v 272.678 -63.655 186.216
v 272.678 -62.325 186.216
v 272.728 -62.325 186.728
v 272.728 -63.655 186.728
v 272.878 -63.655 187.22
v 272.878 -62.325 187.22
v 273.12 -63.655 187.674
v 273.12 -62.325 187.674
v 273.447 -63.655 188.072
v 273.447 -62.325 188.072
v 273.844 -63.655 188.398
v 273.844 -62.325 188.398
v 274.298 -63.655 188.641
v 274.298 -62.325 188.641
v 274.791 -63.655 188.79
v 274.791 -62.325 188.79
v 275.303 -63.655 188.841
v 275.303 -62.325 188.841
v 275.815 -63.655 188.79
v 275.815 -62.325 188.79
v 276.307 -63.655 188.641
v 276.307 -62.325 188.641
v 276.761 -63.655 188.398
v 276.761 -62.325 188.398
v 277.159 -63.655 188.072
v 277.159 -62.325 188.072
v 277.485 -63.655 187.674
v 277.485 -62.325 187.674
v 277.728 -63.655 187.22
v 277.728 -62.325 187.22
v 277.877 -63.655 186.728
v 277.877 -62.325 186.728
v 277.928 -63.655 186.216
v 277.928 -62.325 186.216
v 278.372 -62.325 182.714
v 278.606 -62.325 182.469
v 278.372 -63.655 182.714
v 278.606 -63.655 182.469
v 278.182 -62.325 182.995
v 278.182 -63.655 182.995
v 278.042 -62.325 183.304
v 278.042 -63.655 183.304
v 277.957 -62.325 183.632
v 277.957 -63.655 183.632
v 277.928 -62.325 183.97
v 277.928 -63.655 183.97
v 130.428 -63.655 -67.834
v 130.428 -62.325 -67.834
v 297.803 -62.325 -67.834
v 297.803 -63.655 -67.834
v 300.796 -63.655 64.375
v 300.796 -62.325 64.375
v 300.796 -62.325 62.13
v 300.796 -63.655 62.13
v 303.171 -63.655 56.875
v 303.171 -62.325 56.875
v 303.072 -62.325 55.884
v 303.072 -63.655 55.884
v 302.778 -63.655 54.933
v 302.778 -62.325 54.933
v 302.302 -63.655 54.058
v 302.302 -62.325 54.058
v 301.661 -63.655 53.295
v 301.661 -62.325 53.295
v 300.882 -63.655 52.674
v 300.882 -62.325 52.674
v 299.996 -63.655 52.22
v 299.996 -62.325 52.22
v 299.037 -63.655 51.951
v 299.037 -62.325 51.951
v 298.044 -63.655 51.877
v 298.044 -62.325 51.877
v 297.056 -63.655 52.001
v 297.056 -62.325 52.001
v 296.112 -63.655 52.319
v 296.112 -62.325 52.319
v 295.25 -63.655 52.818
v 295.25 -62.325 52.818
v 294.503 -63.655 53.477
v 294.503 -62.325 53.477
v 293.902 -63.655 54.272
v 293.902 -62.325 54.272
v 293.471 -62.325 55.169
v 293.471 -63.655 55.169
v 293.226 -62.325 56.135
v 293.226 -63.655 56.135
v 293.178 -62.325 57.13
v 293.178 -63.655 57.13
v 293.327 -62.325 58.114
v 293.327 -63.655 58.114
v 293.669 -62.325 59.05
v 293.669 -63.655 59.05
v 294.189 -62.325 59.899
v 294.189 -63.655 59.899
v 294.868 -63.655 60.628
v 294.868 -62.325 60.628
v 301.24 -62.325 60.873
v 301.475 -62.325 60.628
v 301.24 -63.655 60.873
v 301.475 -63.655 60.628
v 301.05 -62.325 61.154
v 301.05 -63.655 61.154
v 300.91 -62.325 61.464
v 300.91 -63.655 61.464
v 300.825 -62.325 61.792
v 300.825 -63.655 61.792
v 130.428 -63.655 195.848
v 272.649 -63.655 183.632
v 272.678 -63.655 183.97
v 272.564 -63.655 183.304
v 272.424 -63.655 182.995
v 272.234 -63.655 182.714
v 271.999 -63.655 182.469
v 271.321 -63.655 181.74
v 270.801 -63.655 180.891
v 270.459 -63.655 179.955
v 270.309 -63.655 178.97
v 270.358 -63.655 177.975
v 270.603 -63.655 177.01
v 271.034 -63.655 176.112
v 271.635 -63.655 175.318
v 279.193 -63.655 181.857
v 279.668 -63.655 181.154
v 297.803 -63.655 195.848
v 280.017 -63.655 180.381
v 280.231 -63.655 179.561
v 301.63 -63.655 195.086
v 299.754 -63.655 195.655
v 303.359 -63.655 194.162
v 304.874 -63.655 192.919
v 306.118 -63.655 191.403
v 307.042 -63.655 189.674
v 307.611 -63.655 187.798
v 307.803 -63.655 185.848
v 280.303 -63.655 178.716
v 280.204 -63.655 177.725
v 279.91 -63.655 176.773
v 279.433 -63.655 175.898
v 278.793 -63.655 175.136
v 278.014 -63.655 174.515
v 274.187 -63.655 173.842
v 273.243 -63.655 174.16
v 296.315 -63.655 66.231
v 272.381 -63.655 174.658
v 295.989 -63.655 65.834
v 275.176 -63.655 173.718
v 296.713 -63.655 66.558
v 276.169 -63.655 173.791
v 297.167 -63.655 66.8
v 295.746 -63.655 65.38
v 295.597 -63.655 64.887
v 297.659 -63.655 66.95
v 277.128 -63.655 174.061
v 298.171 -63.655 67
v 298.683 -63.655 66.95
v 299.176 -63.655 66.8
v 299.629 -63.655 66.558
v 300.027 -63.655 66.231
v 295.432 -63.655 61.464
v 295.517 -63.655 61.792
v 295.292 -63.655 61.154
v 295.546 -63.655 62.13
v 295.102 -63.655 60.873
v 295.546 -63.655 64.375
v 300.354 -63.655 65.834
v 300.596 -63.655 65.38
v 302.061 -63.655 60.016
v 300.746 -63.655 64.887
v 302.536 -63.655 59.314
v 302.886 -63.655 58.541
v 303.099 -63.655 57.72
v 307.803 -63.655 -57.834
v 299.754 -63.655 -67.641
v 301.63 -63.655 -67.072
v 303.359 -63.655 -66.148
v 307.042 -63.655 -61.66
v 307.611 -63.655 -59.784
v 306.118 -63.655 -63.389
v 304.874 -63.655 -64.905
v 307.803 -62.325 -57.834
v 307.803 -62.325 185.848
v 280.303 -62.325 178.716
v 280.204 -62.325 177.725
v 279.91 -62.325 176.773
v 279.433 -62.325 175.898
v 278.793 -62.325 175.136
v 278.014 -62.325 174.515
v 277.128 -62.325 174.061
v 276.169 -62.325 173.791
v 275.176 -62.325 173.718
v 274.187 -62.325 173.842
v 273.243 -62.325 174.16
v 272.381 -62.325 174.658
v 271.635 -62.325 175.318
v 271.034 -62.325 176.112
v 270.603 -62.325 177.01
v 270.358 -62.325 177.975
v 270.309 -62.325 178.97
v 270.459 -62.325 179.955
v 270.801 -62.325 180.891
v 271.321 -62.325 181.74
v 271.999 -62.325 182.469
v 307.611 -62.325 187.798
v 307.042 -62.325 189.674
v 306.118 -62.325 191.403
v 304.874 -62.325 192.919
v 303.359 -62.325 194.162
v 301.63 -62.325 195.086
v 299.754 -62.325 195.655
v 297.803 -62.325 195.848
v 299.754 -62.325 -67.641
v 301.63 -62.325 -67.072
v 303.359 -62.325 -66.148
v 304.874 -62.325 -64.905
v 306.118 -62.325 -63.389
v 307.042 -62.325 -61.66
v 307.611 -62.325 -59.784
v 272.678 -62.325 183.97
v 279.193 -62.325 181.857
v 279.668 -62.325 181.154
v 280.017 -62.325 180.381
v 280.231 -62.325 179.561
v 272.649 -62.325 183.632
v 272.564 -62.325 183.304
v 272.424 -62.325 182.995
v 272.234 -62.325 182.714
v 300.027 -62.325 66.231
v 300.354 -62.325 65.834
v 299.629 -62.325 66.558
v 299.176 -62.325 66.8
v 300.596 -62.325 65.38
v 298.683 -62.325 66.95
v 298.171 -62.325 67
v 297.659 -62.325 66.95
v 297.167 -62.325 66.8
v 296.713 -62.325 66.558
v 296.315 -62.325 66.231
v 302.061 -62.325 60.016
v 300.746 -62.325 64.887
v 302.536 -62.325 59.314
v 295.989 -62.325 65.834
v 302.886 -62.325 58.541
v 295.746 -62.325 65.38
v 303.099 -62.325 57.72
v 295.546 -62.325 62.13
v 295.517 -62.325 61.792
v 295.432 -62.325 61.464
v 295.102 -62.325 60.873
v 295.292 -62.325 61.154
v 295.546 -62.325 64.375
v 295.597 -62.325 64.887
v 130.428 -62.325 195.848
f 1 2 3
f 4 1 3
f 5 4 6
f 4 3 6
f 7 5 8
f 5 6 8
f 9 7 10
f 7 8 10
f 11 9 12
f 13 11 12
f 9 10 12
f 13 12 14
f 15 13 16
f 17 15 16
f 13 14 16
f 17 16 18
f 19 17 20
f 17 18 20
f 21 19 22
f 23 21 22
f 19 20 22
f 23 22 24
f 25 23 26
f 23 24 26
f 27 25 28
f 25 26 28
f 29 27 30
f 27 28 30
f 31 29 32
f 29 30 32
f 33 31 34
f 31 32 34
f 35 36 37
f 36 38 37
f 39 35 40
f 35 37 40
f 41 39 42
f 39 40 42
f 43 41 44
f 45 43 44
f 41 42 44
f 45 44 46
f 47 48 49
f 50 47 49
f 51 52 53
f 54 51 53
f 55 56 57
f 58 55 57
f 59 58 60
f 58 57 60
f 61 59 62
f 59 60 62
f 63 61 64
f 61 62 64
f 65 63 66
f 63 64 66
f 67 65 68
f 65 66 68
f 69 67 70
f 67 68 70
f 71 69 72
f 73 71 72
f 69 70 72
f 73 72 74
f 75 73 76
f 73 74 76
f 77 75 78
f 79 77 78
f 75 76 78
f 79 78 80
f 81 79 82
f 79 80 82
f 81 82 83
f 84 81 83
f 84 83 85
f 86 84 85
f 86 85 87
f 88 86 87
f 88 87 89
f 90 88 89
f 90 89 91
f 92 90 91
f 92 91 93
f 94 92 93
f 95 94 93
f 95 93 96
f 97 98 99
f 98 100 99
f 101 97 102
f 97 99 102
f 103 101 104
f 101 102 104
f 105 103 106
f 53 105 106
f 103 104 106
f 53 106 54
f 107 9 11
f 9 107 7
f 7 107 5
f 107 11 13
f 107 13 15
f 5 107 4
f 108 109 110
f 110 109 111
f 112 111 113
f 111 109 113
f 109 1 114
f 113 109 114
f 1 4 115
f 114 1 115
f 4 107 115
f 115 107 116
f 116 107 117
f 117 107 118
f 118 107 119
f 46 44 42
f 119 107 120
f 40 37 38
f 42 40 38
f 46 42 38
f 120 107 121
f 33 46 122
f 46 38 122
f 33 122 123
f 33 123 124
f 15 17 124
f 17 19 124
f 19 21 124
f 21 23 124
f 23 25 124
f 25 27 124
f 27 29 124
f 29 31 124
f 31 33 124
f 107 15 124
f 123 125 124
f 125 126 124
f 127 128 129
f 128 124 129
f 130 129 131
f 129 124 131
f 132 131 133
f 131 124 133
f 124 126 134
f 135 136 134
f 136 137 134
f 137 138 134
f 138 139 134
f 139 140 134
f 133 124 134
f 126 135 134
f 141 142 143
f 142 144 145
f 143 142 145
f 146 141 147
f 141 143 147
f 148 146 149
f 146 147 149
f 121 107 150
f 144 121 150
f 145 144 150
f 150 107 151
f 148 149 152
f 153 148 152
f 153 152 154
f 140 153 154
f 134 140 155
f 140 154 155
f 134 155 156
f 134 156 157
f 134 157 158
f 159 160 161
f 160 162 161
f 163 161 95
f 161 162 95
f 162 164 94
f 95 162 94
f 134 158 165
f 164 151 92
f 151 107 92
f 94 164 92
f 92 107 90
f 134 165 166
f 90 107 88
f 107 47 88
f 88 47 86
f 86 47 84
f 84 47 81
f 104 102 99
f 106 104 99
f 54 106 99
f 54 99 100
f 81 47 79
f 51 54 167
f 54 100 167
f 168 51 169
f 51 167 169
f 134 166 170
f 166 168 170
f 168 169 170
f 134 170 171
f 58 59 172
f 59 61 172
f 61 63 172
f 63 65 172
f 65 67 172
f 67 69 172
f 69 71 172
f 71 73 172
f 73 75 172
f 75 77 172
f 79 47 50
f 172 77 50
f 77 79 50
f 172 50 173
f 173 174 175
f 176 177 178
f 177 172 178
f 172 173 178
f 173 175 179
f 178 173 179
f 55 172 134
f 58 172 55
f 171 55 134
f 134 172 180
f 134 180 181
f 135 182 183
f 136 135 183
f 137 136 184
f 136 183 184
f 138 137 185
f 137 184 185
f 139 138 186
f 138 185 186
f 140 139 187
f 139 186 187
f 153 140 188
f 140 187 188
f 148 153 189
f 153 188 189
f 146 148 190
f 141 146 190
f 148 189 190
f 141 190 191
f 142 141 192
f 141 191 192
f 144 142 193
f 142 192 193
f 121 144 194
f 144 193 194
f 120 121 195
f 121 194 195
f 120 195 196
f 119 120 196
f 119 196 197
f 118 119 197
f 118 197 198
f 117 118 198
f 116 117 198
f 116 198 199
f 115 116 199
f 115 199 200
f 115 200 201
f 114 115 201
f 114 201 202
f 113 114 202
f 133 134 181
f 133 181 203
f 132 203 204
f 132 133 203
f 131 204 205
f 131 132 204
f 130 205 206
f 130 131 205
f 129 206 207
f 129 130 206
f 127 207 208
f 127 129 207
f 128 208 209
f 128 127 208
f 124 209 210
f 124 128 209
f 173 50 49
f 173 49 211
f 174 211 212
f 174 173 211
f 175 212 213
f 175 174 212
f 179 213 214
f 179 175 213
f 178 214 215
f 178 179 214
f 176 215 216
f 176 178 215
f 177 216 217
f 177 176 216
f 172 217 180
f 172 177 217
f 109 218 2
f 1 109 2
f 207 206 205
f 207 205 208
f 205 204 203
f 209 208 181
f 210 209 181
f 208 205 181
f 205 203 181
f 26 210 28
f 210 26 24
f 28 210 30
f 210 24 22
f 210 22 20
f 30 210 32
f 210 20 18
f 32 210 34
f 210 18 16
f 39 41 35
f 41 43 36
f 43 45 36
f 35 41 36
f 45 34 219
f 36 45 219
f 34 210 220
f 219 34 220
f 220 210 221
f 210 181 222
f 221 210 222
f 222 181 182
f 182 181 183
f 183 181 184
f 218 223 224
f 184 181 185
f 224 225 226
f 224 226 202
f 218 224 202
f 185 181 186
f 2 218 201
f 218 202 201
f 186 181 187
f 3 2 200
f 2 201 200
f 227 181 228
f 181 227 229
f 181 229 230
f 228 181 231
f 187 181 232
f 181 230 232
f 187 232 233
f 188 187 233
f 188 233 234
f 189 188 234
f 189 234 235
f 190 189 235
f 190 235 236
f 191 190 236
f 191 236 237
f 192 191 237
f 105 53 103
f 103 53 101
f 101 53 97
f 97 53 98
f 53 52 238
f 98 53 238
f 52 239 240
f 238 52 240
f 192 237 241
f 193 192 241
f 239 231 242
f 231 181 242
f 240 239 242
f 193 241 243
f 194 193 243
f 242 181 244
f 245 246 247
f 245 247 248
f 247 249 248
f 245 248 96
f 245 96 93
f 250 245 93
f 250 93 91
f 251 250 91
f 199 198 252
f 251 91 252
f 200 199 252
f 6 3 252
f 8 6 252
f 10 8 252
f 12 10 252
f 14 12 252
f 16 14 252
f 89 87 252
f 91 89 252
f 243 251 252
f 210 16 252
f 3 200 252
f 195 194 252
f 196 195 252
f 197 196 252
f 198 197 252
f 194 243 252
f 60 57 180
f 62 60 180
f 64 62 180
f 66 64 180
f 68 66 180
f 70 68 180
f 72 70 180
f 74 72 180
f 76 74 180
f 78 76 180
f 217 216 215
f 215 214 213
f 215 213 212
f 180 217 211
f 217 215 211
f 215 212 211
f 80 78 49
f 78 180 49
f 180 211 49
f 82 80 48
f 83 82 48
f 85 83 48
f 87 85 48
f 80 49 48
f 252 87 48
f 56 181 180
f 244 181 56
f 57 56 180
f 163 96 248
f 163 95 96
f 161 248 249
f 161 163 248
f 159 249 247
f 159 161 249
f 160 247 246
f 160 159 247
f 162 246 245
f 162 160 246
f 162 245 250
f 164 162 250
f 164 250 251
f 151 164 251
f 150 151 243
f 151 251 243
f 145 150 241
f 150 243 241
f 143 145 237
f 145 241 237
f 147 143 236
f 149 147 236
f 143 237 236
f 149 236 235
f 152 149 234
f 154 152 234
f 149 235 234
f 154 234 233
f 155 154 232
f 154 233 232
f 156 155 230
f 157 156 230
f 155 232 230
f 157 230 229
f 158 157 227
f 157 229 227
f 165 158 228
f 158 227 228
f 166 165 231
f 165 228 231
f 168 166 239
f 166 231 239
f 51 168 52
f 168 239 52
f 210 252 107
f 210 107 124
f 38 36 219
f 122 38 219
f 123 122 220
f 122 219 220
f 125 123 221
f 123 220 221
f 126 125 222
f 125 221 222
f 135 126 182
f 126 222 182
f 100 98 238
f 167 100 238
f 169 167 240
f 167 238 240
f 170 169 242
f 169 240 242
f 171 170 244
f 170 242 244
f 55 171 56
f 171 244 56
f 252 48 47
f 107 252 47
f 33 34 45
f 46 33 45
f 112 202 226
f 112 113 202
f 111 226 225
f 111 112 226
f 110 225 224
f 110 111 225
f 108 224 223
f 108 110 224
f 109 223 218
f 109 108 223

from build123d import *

# Parameters (mm, degrees)
BASE_FLANGE2_DEPTH         = 1.33
EDGE_FLANGE3_DEPTH         = 263.681161317
CAPTIVE_M5_BOLT_SLOT_REACH = 370.8
HOLE_FILLETS_R             = 2
HEM2_START                 = -67.833575783
HEM2_DEPTH                 = 263.681161317
HEM2_2_DEPTH               = 263.681161317
FLAT_PATTERN2_START        = -67.833575783
FLAT_PATTERN2_DEPTH        = 263.681161317
FLAT_PATTERN2_2_DEPTH      = 263.681161317


# Read off the part's stored shape, not the designer's step: Hem2, Flat-Pattern2
# Sheet-metal steps are written as plain solids
with BuildPart() as part:
    # Sketch5 → Base-Flange2 (new body)
    with BuildSketch(Plane(origin=(0, -63.655404639, 0), x_dir=(-1, 0, 0), z_dir=(0, 1, 0))):
        with BuildLine():
            Line((-297.802816543, 195.847585534), (-194.039416543, 195.847585534))
            Line((-194.039416543, 195.847585534), (-194.039416543, -67.833575783))
            Line((-194.039416543, -67.833575783), (-297.802816543, -67.833575783))
            ThreePointArc((-297.802816543, -67.833575783), (-304.873884355, -64.904643594), (-307.802816543, -57.833575783))
            Line((-307.802816543, -57.833575783), (-307.802816543, 185.847585534))
            ThreePointArc((-307.802816543, 185.847585534), (-304.873884355, 192.918653346), (-297.802816543, 195.847585534))
        make_face()
    extrude(amount=BASE_FLANGE2_DEPTH)

    # Edge-Flange3 section (across the edge) → Edge-Flange3 (add)
    with BuildSketch(Plane(origin=(193.302816543, -63.655404639, 195.847585534), x_dir=(1, 0, 0), z_dir=(0, 0, -1))):
        with BuildLine():
            Line((-1.33, 0.7366), (-1.33, 52.66))
            Line((-1.33, 52.66), (0, 52.66))
            Line((0, 52.66), (0, 0.7366))
            ThreePointArc((0, 0.7366), (0.215745145, 0.215745145), (0.7366, 0))
            Line((0.7366, 0), (0.7366, -1.33))
            ThreePointArc((0.7366, -1.33), (-0.724706874, -0.724706874), (-1.33, 0.7366))
        make_face()
    extrude(amount=EDGE_FLANGE3_DEPTH)

    # Sketch17 → Captive M5 Bolt Slot (cut, up to next)
    with BuildSketch(Plane(origin=(0, -62.325404639, 0), x_dir=(1, 0, 0), z_dir=(0, 1, 0)), mode=Mode.PRIVATE) as captive_m5_bolt_slot_sk1:
        with BuildLine():
            ThreePointArc((280.302816543, -178.715885534), (272.866117957, -174.349823235), (272.677816543, -182.971396667))
            Line((272.677816543, -182.971396667), (272.677816543, -178.715885534))
            ThreePointArc((272.677816543, -178.715885534), (275.302816543, -176.090885534), (277.927816543, -178.715885534))
            Line((277.927816543, -178.715885534), (277.927816543, -182.971396667))
            ThreePointArc((277.927816543, -182.971396667), (279.668878843, -181.15258412), (280.302816543, -178.715885534))
        make_face()
    captive_m5_bolt_slot_tool1 = extrude(captive_m5_bolt_slot_sk1.sketch, amount=-CAPTIVE_M5_BOLT_SLOT_REACH, mode=Mode.PRIVATE) & part.part
    # Sketch17 → Captive M5 Bolt Slot (cut, up to next)
    with BuildSketch(Plane(origin=(0, -62.325404639, 0), x_dir=(1, 0, 0), z_dir=(0, 1, 0)), mode=Mode.PRIVATE) as captive_m5_bolt_slot_sk2:
        with BuildLine():
            Line((272.677816543, -178.715885534), (272.677816543, -182.971396667))
            ThreePointArc((272.677816543, -182.971396667), (275.302816543, -183.715885534), (277.927816543, -182.971396667))
            Line((277.927816543, -182.971396667), (277.927816543, -178.715885534))
            ThreePointArc((277.927816543, -178.715885534), (275.302816543, -176.090885534), (272.677816543, -178.715885534))
        make_face()
    captive_m5_bolt_slot_tool2 = extrude(captive_m5_bolt_slot_sk2.sketch, amount=-CAPTIVE_M5_BOLT_SLOT_REACH, mode=Mode.PRIVATE) & part.part
    # Sketch17 → Captive M5 Bolt Slot (cut, up to next)
    with BuildSketch(Plane(origin=(0, -62.325404639, 0), x_dir=(1, 0, 0), z_dir=(0, 1, 0)), mode=Mode.PRIVATE) as captive_m5_bolt_slot_sk3:
        with BuildLine():
            ThreePointArc((280.302816543, -178.715885534), (272.866117957, -174.349823235), (272.677816543, -182.971396667))
            Line((272.677816543, -182.971396667), (272.677816543, -178.715885534))
            ThreePointArc((272.677816543, -178.715885534), (275.302816543, -176.090885534), (277.927816543, -178.715885534))
            Line((277.927816543, -178.715885534), (277.927816543, -182.971396667))
            ThreePointArc((277.927816543, -182.971396667), (279.668878843, -181.15258412), (280.302816543, -178.715885534))
        make_face()
    captive_m5_bolt_slot_tool3 = extrude(captive_m5_bolt_slot_sk3.sketch, amount=-CAPTIVE_M5_BOLT_SLOT_REACH, mode=Mode.PRIVATE) & part.part
    # Sketch17 → Captive M5 Bolt Slot (cut, up to next)
    with BuildSketch(Plane(origin=(0, -62.325404639, 0), x_dir=(1, 0, 0), z_dir=(0, 1, 0)), mode=Mode.PRIVATE) as captive_m5_bolt_slot_sk4:
        with BuildLine():
            Line((272.677816543, -178.715885534), (272.677816543, -182.971396667))
            ThreePointArc((272.677816543, -182.971396667), (275.302816543, -183.715885534), (277.927816543, -182.971396667))
            Line((277.927816543, -182.971396667), (277.927816543, -178.715885534))
            ThreePointArc((277.927816543, -178.715885534), (275.302816543, -176.090885534), (272.677816543, -178.715885534))
        make_face()
    captive_m5_bolt_slot_tool4 = extrude(captive_m5_bolt_slot_sk4.sketch, amount=-CAPTIVE_M5_BOLT_SLOT_REACH, mode=Mode.PRIVATE) & part.part
    # Sketch17 → Captive M5 Bolt Slot (cut, up to next)
    with BuildSketch(Plane(origin=(0, -62.325404639, 0), x_dir=(1, 0, 0), z_dir=(0, 1, 0)), mode=Mode.PRIVATE) as captive_m5_bolt_slot_sk5:
        with BuildLine():
            Line((272.677816543, -182.971396667), (272.677816543, -186.215885534))
            ThreePointArc((272.677816543, -186.215885534), (275.302816543, -188.840885534), (277.927816543, -186.215885534))
            Line((277.927816543, -186.215885534), (277.927816543, -182.971396667))
            ThreePointArc((277.927816543, -182.971396667), (275.302816543, -183.715885534), (272.677816543, -182.971396667))
        make_face()
    captive_m5_bolt_slot_tool5 = extrude(captive_m5_bolt_slot_sk5.sketch, amount=-CAPTIVE_M5_BOLT_SLOT_REACH, mode=Mode.PRIVATE) & part.part
    # Sketch17 → Captive M5 Bolt Slot (cut, up to next)
    with BuildSketch(Plane(origin=(0, -62.325404639, 0), x_dir=(1, 0, 0), z_dir=(0, 1, 0)), mode=Mode.PRIVATE) as captive_m5_bolt_slot_sk6:
        with BuildLine():
            ThreePointArc((303.171116543, -56.875304876), (295.734417957, -52.509242577), (295.546116543, -61.130816008))
            Line((295.546116543, -61.130816008), (295.546116543, -56.875304876))
            ThreePointArc((295.546116543, -56.875304876), (298.171116543, -54.250304876), (300.796116543, -56.875304876))
            Line((300.796116543, -56.875304876), (300.796116543, -61.130816008))
            ThreePointArc((300.796116543, -61.130816008), (302.537178843, -59.312003462), (303.171116543, -56.875304876))
        make_face()
    captive_m5_bolt_slot_tool6 = extrude(captive_m5_bolt_slot_sk6.sketch, amount=-CAPTIVE_M5_BOLT_SLOT_REACH, mode=Mode.PRIVATE) & part.part
    # Sketch17 → Captive M5 Bolt Slot (cut, up to next)
    with BuildSketch(Plane(origin=(0, -62.325404639, 0), x_dir=(1, 0, 0), z_dir=(0, 1, 0)), mode=Mode.PRIVATE) as captive_m5_bolt_slot_sk7:
        with BuildLine():
            Line((295.546116543, -56.875304876), (295.546116543, -61.130816008))
            ThreePointArc((295.546116543, -61.130816008), (298.171116543, -61.875304876), (300.796116543, -61.130816008))
            Line((300.796116543, -61.130816008), (300.796116543, -56.875304876))
            ThreePointArc((300.796116543, -56.875304876), (298.171116543, -54.250304876), (295.546116543, -56.875304876))
        make_face()
    captive_m5_bolt_slot_tool7 = extrude(captive_m5_bolt_slot_sk7.sketch, amount=-CAPTIVE_M5_BOLT_SLOT_REACH, mode=Mode.PRIVATE) & part.part
    # Sketch17 → Captive M5 Bolt Slot (cut, up to next)
    with BuildSketch(Plane(origin=(0, -62.325404639, 0), x_dir=(1, 0, 0), z_dir=(0, 1, 0)), mode=Mode.PRIVATE) as captive_m5_bolt_slot_sk8:
        with BuildLine():
            ThreePointArc((303.171116543, -56.875304876), (295.734417957, -52.509242577), (295.546116543, -61.130816008))
            Line((295.546116543, -61.130816008), (295.546116543, -56.875304876))
            ThreePointArc((295.546116543, -56.875304876), (298.171116543, -54.250304876), (300.796116543, -56.875304876))
            Line((300.796116543, -56.875304876), (300.796116543, -61.130816008))
            ThreePointArc((300.796116543, -61.130816008), (302.537178843, -59.312003462), (303.171116543, -56.875304876))
        make_face()
    captive_m5_bolt_slot_tool8 = extrude(captive_m5_bolt_slot_sk8.sketch, amount=-CAPTIVE_M5_BOLT_SLOT_REACH, mode=Mode.PRIVATE) & part.part
    # Sketch17 → Captive M5 Bolt Slot (cut, up to next)
    with BuildSketch(Plane(origin=(0, -62.325404639, 0), x_dir=(1, 0, 0), z_dir=(0, 1, 0)), mode=Mode.PRIVATE) as captive_m5_bolt_slot_sk9:
        with BuildLine():
            Line((295.546116543, -56.875304876), (295.546116543, -61.130816008))
            ThreePointArc((295.546116543, -61.130816008), (298.171116543, -61.875304876), (300.796116543, -61.130816008))
            Line((300.796116543, -61.130816008), (300.796116543, -56.875304876))
            ThreePointArc((300.796116543, -56.875304876), (298.171116543, -54.250304876), (295.546116543, -56.875304876))
        make_face()
    captive_m5_bolt_slot_tool9 = extrude(captive_m5_bolt_slot_sk9.sketch, amount=-CAPTIVE_M5_BOLT_SLOT_REACH, mode=Mode.PRIVATE) & part.part
    # Sketch17 → Captive M5 Bolt Slot (cut, up to next)
    with BuildSketch(Plane(origin=(0, -62.325404639, 0), x_dir=(1, 0, 0), z_dir=(0, 1, 0)), mode=Mode.PRIVATE) as captive_m5_bolt_slot_sk10:
        with BuildLine():
            Line((295.546116543, -61.130816008), (295.546116543, -64.375304876))
            ThreePointArc((295.546116543, -64.375304876), (298.171116543, -67.000304876), (300.796116543, -64.375304876))
            Line((300.796116543, -64.375304876), (300.796116543, -61.130816008))
            ThreePointArc((300.796116543, -61.130816008), (298.171116543, -61.875304876), (295.546116543, -61.130816008))
        make_face()
    captive_m5_bolt_slot_tool10 = extrude(captive_m5_bolt_slot_sk10.sketch, amount=-CAPTIVE_M5_BOLT_SLOT_REACH, mode=Mode.PRIVATE) & part.part
    add(captive_m5_bolt_slot_tool1.solids().sort_by_distance((272.932522, -62.325405, 174.468806))[0], mode=Mode.SUBTRACT)
    add(captive_m5_bolt_slot_tool2.solids().sort_by_distance((275.302817, -62.325405, 180.043279))[0], mode=Mode.SUBTRACT)
    add(captive_m5_bolt_slot_tool3.solids().sort_by_distance((272.932522, -62.325405, 174.468806))[0], mode=Mode.SUBTRACT)
    add(captive_m5_bolt_slot_tool4.solids().sort_by_distance((275.302817, -62.325405, 180.043279))[0], mode=Mode.SUBTRACT)
    add(captive_m5_bolt_slot_tool5.solids().sort_by_distance((275.302817, -62.325405, 185.907324))[0], mode=Mode.SUBTRACT)
    add(captive_m5_bolt_slot_tool6.solids().sort_by_distance((302.418196, -62.325405, 59.245599))[0], mode=Mode.SUBTRACT)
    add(captive_m5_bolt_slot_tool7.solids().sort_by_distance((298.171117, -62.325405, 58.202699))[0], mode=Mode.SUBTRACT)
    add(captive_m5_bolt_slot_tool8.solids().sort_by_distance((302.418196, -62.325405, 59.245599))[0], mode=Mode.SUBTRACT)
    add(captive_m5_bolt_slot_tool9.solids().sort_by_distance((298.171117, -62.325405, 58.202699))[0], mode=Mode.SUBTRACT)
    add(captive_m5_bolt_slot_tool10.solids().sort_by_distance((298.171117, -62.325405, 64.066743))[0], mode=Mode.SUBTRACT)

    # Hole Fillets
    hole_fillets_edges = [part.edges().sort_by_distance(p)[0] for p in [
        (272.677816543, -62.990404639, 182.971396667),
        (277.927816543, -62.990404639, 182.971396667),
        (300.796116543, -62.990404639, 61.130816008),
        (295.546116543, -62.990404639, 61.130816008),
    ]]
    fillet(hole_fillets_edges, radius=HOLE_FILLETS_R)

    # Hem2 outline → Hem2 (cut)
    with BuildSketch(Plane.XY.offset(HEM2_START)):
        with BuildLine():
            Line((193.302816543, -116.315404639), (193.302816543, -116.314498544))
            ThreePointArc((193.302816543, -116.314498544), (192.359488803, -115.893371235), (191.972816543, -114.935404639))
            Line((191.972816543, -114.935404639), (191.972816543, -116.315404639))
            Line((191.972816543, -116.315404639), (193.302816543, -116.315404639))
        make_face()
    extrude(amount=HEM2_DEPTH, mode=Mode.SUBTRACT)

    # Hem2 2 outline → Hem2 2 (add)
    with BuildSketch(Plane.XY.offset(HEM2_START)):
        with BuildLine():
            Line((194.732816543, -106.315404639), (193.402816543, -106.315404639))
            Line((193.402816543, -106.315404639), (193.402816543, -114.935404639))
            ThreePointArc((193.402816543, -114.935404639), (193.352816543, -114.985404639), (193.302816543, -114.935404639))
            Line((193.302816543, -114.935404639), (193.302816543, -116.314498544))
            ThreePointArc((193.302816543, -116.314498544), (194.310783139, -115.928732379), (194.732816543, -114.935404639))
            Line((194.732816543, -114.935404639), (194.732816543, -106.315404639))
        make_face()
    extrude(amount=HEM2_2_DEPTH)

    # Flat-Pattern2 outline → Flat-Pattern2 (cut)
    with BuildSketch(Plane.XY.offset(FLAT_PATTERN2_START)):
        with BuildLine():
            Line((194.039416543, -63.655404639), (192.108547309, -63.655404639))
            ThreePointArc((192.108547309, -63.655404639), (192.007032485, -64.017504171), (191.972816543, -64.392004639))
            Line((191.972816543, -64.392004639), (191.972816543, -114.935404639))
            ThreePointArc((191.972816543, -114.935404639), (193.352816543, -116.315404639), (194.732816543, -114.935404639))
            Line((194.732816543, -114.935404639), (194.732816543, -106.315404639))
            Line((194.732816543, -106.315404639), (193.402816543, -106.315404639))
            Line((193.402816543, -106.315404639), (193.402816543, -114.935404639))
            ThreePointArc((193.402816543, -114.935404639), (193.352816543, -114.985404639), (193.302816543, -114.935404639))
            Line((193.302816543, -114.935404639), (193.302816543, -64.392004639))
            ThreePointArc((193.302816543, -64.392004639), (193.518561688, -63.871149784), (194.039416543, -63.655404639))
        make_face()
    extrude(amount=FLAT_PATTERN2_DEPTH, mode=Mode.SUBTRACT)

    # Flat-Pattern2 2 outline → Flat-Pattern2 2 (add)
    with BuildSketch(Plane.XY.offset(FLAT_PATTERN2_START)):
        with BuildLine():
            ThreePointArc((192.108547309, -63.655404639), (192.867115814, -62.690080269), (194.039416543, -62.325404639))
            Line((194.039416543, -62.325404639), (130.428149664, -62.325404639))
            Line((130.428149664, -62.325404639), (130.428149664, -63.655404639))
            Line((130.428149664, -63.655404639), (192.108547309, -63.655404639))
        make_face()
    extrude(amount=FLAT_PATTERN2_2_DEPTH)


solid = part.part
